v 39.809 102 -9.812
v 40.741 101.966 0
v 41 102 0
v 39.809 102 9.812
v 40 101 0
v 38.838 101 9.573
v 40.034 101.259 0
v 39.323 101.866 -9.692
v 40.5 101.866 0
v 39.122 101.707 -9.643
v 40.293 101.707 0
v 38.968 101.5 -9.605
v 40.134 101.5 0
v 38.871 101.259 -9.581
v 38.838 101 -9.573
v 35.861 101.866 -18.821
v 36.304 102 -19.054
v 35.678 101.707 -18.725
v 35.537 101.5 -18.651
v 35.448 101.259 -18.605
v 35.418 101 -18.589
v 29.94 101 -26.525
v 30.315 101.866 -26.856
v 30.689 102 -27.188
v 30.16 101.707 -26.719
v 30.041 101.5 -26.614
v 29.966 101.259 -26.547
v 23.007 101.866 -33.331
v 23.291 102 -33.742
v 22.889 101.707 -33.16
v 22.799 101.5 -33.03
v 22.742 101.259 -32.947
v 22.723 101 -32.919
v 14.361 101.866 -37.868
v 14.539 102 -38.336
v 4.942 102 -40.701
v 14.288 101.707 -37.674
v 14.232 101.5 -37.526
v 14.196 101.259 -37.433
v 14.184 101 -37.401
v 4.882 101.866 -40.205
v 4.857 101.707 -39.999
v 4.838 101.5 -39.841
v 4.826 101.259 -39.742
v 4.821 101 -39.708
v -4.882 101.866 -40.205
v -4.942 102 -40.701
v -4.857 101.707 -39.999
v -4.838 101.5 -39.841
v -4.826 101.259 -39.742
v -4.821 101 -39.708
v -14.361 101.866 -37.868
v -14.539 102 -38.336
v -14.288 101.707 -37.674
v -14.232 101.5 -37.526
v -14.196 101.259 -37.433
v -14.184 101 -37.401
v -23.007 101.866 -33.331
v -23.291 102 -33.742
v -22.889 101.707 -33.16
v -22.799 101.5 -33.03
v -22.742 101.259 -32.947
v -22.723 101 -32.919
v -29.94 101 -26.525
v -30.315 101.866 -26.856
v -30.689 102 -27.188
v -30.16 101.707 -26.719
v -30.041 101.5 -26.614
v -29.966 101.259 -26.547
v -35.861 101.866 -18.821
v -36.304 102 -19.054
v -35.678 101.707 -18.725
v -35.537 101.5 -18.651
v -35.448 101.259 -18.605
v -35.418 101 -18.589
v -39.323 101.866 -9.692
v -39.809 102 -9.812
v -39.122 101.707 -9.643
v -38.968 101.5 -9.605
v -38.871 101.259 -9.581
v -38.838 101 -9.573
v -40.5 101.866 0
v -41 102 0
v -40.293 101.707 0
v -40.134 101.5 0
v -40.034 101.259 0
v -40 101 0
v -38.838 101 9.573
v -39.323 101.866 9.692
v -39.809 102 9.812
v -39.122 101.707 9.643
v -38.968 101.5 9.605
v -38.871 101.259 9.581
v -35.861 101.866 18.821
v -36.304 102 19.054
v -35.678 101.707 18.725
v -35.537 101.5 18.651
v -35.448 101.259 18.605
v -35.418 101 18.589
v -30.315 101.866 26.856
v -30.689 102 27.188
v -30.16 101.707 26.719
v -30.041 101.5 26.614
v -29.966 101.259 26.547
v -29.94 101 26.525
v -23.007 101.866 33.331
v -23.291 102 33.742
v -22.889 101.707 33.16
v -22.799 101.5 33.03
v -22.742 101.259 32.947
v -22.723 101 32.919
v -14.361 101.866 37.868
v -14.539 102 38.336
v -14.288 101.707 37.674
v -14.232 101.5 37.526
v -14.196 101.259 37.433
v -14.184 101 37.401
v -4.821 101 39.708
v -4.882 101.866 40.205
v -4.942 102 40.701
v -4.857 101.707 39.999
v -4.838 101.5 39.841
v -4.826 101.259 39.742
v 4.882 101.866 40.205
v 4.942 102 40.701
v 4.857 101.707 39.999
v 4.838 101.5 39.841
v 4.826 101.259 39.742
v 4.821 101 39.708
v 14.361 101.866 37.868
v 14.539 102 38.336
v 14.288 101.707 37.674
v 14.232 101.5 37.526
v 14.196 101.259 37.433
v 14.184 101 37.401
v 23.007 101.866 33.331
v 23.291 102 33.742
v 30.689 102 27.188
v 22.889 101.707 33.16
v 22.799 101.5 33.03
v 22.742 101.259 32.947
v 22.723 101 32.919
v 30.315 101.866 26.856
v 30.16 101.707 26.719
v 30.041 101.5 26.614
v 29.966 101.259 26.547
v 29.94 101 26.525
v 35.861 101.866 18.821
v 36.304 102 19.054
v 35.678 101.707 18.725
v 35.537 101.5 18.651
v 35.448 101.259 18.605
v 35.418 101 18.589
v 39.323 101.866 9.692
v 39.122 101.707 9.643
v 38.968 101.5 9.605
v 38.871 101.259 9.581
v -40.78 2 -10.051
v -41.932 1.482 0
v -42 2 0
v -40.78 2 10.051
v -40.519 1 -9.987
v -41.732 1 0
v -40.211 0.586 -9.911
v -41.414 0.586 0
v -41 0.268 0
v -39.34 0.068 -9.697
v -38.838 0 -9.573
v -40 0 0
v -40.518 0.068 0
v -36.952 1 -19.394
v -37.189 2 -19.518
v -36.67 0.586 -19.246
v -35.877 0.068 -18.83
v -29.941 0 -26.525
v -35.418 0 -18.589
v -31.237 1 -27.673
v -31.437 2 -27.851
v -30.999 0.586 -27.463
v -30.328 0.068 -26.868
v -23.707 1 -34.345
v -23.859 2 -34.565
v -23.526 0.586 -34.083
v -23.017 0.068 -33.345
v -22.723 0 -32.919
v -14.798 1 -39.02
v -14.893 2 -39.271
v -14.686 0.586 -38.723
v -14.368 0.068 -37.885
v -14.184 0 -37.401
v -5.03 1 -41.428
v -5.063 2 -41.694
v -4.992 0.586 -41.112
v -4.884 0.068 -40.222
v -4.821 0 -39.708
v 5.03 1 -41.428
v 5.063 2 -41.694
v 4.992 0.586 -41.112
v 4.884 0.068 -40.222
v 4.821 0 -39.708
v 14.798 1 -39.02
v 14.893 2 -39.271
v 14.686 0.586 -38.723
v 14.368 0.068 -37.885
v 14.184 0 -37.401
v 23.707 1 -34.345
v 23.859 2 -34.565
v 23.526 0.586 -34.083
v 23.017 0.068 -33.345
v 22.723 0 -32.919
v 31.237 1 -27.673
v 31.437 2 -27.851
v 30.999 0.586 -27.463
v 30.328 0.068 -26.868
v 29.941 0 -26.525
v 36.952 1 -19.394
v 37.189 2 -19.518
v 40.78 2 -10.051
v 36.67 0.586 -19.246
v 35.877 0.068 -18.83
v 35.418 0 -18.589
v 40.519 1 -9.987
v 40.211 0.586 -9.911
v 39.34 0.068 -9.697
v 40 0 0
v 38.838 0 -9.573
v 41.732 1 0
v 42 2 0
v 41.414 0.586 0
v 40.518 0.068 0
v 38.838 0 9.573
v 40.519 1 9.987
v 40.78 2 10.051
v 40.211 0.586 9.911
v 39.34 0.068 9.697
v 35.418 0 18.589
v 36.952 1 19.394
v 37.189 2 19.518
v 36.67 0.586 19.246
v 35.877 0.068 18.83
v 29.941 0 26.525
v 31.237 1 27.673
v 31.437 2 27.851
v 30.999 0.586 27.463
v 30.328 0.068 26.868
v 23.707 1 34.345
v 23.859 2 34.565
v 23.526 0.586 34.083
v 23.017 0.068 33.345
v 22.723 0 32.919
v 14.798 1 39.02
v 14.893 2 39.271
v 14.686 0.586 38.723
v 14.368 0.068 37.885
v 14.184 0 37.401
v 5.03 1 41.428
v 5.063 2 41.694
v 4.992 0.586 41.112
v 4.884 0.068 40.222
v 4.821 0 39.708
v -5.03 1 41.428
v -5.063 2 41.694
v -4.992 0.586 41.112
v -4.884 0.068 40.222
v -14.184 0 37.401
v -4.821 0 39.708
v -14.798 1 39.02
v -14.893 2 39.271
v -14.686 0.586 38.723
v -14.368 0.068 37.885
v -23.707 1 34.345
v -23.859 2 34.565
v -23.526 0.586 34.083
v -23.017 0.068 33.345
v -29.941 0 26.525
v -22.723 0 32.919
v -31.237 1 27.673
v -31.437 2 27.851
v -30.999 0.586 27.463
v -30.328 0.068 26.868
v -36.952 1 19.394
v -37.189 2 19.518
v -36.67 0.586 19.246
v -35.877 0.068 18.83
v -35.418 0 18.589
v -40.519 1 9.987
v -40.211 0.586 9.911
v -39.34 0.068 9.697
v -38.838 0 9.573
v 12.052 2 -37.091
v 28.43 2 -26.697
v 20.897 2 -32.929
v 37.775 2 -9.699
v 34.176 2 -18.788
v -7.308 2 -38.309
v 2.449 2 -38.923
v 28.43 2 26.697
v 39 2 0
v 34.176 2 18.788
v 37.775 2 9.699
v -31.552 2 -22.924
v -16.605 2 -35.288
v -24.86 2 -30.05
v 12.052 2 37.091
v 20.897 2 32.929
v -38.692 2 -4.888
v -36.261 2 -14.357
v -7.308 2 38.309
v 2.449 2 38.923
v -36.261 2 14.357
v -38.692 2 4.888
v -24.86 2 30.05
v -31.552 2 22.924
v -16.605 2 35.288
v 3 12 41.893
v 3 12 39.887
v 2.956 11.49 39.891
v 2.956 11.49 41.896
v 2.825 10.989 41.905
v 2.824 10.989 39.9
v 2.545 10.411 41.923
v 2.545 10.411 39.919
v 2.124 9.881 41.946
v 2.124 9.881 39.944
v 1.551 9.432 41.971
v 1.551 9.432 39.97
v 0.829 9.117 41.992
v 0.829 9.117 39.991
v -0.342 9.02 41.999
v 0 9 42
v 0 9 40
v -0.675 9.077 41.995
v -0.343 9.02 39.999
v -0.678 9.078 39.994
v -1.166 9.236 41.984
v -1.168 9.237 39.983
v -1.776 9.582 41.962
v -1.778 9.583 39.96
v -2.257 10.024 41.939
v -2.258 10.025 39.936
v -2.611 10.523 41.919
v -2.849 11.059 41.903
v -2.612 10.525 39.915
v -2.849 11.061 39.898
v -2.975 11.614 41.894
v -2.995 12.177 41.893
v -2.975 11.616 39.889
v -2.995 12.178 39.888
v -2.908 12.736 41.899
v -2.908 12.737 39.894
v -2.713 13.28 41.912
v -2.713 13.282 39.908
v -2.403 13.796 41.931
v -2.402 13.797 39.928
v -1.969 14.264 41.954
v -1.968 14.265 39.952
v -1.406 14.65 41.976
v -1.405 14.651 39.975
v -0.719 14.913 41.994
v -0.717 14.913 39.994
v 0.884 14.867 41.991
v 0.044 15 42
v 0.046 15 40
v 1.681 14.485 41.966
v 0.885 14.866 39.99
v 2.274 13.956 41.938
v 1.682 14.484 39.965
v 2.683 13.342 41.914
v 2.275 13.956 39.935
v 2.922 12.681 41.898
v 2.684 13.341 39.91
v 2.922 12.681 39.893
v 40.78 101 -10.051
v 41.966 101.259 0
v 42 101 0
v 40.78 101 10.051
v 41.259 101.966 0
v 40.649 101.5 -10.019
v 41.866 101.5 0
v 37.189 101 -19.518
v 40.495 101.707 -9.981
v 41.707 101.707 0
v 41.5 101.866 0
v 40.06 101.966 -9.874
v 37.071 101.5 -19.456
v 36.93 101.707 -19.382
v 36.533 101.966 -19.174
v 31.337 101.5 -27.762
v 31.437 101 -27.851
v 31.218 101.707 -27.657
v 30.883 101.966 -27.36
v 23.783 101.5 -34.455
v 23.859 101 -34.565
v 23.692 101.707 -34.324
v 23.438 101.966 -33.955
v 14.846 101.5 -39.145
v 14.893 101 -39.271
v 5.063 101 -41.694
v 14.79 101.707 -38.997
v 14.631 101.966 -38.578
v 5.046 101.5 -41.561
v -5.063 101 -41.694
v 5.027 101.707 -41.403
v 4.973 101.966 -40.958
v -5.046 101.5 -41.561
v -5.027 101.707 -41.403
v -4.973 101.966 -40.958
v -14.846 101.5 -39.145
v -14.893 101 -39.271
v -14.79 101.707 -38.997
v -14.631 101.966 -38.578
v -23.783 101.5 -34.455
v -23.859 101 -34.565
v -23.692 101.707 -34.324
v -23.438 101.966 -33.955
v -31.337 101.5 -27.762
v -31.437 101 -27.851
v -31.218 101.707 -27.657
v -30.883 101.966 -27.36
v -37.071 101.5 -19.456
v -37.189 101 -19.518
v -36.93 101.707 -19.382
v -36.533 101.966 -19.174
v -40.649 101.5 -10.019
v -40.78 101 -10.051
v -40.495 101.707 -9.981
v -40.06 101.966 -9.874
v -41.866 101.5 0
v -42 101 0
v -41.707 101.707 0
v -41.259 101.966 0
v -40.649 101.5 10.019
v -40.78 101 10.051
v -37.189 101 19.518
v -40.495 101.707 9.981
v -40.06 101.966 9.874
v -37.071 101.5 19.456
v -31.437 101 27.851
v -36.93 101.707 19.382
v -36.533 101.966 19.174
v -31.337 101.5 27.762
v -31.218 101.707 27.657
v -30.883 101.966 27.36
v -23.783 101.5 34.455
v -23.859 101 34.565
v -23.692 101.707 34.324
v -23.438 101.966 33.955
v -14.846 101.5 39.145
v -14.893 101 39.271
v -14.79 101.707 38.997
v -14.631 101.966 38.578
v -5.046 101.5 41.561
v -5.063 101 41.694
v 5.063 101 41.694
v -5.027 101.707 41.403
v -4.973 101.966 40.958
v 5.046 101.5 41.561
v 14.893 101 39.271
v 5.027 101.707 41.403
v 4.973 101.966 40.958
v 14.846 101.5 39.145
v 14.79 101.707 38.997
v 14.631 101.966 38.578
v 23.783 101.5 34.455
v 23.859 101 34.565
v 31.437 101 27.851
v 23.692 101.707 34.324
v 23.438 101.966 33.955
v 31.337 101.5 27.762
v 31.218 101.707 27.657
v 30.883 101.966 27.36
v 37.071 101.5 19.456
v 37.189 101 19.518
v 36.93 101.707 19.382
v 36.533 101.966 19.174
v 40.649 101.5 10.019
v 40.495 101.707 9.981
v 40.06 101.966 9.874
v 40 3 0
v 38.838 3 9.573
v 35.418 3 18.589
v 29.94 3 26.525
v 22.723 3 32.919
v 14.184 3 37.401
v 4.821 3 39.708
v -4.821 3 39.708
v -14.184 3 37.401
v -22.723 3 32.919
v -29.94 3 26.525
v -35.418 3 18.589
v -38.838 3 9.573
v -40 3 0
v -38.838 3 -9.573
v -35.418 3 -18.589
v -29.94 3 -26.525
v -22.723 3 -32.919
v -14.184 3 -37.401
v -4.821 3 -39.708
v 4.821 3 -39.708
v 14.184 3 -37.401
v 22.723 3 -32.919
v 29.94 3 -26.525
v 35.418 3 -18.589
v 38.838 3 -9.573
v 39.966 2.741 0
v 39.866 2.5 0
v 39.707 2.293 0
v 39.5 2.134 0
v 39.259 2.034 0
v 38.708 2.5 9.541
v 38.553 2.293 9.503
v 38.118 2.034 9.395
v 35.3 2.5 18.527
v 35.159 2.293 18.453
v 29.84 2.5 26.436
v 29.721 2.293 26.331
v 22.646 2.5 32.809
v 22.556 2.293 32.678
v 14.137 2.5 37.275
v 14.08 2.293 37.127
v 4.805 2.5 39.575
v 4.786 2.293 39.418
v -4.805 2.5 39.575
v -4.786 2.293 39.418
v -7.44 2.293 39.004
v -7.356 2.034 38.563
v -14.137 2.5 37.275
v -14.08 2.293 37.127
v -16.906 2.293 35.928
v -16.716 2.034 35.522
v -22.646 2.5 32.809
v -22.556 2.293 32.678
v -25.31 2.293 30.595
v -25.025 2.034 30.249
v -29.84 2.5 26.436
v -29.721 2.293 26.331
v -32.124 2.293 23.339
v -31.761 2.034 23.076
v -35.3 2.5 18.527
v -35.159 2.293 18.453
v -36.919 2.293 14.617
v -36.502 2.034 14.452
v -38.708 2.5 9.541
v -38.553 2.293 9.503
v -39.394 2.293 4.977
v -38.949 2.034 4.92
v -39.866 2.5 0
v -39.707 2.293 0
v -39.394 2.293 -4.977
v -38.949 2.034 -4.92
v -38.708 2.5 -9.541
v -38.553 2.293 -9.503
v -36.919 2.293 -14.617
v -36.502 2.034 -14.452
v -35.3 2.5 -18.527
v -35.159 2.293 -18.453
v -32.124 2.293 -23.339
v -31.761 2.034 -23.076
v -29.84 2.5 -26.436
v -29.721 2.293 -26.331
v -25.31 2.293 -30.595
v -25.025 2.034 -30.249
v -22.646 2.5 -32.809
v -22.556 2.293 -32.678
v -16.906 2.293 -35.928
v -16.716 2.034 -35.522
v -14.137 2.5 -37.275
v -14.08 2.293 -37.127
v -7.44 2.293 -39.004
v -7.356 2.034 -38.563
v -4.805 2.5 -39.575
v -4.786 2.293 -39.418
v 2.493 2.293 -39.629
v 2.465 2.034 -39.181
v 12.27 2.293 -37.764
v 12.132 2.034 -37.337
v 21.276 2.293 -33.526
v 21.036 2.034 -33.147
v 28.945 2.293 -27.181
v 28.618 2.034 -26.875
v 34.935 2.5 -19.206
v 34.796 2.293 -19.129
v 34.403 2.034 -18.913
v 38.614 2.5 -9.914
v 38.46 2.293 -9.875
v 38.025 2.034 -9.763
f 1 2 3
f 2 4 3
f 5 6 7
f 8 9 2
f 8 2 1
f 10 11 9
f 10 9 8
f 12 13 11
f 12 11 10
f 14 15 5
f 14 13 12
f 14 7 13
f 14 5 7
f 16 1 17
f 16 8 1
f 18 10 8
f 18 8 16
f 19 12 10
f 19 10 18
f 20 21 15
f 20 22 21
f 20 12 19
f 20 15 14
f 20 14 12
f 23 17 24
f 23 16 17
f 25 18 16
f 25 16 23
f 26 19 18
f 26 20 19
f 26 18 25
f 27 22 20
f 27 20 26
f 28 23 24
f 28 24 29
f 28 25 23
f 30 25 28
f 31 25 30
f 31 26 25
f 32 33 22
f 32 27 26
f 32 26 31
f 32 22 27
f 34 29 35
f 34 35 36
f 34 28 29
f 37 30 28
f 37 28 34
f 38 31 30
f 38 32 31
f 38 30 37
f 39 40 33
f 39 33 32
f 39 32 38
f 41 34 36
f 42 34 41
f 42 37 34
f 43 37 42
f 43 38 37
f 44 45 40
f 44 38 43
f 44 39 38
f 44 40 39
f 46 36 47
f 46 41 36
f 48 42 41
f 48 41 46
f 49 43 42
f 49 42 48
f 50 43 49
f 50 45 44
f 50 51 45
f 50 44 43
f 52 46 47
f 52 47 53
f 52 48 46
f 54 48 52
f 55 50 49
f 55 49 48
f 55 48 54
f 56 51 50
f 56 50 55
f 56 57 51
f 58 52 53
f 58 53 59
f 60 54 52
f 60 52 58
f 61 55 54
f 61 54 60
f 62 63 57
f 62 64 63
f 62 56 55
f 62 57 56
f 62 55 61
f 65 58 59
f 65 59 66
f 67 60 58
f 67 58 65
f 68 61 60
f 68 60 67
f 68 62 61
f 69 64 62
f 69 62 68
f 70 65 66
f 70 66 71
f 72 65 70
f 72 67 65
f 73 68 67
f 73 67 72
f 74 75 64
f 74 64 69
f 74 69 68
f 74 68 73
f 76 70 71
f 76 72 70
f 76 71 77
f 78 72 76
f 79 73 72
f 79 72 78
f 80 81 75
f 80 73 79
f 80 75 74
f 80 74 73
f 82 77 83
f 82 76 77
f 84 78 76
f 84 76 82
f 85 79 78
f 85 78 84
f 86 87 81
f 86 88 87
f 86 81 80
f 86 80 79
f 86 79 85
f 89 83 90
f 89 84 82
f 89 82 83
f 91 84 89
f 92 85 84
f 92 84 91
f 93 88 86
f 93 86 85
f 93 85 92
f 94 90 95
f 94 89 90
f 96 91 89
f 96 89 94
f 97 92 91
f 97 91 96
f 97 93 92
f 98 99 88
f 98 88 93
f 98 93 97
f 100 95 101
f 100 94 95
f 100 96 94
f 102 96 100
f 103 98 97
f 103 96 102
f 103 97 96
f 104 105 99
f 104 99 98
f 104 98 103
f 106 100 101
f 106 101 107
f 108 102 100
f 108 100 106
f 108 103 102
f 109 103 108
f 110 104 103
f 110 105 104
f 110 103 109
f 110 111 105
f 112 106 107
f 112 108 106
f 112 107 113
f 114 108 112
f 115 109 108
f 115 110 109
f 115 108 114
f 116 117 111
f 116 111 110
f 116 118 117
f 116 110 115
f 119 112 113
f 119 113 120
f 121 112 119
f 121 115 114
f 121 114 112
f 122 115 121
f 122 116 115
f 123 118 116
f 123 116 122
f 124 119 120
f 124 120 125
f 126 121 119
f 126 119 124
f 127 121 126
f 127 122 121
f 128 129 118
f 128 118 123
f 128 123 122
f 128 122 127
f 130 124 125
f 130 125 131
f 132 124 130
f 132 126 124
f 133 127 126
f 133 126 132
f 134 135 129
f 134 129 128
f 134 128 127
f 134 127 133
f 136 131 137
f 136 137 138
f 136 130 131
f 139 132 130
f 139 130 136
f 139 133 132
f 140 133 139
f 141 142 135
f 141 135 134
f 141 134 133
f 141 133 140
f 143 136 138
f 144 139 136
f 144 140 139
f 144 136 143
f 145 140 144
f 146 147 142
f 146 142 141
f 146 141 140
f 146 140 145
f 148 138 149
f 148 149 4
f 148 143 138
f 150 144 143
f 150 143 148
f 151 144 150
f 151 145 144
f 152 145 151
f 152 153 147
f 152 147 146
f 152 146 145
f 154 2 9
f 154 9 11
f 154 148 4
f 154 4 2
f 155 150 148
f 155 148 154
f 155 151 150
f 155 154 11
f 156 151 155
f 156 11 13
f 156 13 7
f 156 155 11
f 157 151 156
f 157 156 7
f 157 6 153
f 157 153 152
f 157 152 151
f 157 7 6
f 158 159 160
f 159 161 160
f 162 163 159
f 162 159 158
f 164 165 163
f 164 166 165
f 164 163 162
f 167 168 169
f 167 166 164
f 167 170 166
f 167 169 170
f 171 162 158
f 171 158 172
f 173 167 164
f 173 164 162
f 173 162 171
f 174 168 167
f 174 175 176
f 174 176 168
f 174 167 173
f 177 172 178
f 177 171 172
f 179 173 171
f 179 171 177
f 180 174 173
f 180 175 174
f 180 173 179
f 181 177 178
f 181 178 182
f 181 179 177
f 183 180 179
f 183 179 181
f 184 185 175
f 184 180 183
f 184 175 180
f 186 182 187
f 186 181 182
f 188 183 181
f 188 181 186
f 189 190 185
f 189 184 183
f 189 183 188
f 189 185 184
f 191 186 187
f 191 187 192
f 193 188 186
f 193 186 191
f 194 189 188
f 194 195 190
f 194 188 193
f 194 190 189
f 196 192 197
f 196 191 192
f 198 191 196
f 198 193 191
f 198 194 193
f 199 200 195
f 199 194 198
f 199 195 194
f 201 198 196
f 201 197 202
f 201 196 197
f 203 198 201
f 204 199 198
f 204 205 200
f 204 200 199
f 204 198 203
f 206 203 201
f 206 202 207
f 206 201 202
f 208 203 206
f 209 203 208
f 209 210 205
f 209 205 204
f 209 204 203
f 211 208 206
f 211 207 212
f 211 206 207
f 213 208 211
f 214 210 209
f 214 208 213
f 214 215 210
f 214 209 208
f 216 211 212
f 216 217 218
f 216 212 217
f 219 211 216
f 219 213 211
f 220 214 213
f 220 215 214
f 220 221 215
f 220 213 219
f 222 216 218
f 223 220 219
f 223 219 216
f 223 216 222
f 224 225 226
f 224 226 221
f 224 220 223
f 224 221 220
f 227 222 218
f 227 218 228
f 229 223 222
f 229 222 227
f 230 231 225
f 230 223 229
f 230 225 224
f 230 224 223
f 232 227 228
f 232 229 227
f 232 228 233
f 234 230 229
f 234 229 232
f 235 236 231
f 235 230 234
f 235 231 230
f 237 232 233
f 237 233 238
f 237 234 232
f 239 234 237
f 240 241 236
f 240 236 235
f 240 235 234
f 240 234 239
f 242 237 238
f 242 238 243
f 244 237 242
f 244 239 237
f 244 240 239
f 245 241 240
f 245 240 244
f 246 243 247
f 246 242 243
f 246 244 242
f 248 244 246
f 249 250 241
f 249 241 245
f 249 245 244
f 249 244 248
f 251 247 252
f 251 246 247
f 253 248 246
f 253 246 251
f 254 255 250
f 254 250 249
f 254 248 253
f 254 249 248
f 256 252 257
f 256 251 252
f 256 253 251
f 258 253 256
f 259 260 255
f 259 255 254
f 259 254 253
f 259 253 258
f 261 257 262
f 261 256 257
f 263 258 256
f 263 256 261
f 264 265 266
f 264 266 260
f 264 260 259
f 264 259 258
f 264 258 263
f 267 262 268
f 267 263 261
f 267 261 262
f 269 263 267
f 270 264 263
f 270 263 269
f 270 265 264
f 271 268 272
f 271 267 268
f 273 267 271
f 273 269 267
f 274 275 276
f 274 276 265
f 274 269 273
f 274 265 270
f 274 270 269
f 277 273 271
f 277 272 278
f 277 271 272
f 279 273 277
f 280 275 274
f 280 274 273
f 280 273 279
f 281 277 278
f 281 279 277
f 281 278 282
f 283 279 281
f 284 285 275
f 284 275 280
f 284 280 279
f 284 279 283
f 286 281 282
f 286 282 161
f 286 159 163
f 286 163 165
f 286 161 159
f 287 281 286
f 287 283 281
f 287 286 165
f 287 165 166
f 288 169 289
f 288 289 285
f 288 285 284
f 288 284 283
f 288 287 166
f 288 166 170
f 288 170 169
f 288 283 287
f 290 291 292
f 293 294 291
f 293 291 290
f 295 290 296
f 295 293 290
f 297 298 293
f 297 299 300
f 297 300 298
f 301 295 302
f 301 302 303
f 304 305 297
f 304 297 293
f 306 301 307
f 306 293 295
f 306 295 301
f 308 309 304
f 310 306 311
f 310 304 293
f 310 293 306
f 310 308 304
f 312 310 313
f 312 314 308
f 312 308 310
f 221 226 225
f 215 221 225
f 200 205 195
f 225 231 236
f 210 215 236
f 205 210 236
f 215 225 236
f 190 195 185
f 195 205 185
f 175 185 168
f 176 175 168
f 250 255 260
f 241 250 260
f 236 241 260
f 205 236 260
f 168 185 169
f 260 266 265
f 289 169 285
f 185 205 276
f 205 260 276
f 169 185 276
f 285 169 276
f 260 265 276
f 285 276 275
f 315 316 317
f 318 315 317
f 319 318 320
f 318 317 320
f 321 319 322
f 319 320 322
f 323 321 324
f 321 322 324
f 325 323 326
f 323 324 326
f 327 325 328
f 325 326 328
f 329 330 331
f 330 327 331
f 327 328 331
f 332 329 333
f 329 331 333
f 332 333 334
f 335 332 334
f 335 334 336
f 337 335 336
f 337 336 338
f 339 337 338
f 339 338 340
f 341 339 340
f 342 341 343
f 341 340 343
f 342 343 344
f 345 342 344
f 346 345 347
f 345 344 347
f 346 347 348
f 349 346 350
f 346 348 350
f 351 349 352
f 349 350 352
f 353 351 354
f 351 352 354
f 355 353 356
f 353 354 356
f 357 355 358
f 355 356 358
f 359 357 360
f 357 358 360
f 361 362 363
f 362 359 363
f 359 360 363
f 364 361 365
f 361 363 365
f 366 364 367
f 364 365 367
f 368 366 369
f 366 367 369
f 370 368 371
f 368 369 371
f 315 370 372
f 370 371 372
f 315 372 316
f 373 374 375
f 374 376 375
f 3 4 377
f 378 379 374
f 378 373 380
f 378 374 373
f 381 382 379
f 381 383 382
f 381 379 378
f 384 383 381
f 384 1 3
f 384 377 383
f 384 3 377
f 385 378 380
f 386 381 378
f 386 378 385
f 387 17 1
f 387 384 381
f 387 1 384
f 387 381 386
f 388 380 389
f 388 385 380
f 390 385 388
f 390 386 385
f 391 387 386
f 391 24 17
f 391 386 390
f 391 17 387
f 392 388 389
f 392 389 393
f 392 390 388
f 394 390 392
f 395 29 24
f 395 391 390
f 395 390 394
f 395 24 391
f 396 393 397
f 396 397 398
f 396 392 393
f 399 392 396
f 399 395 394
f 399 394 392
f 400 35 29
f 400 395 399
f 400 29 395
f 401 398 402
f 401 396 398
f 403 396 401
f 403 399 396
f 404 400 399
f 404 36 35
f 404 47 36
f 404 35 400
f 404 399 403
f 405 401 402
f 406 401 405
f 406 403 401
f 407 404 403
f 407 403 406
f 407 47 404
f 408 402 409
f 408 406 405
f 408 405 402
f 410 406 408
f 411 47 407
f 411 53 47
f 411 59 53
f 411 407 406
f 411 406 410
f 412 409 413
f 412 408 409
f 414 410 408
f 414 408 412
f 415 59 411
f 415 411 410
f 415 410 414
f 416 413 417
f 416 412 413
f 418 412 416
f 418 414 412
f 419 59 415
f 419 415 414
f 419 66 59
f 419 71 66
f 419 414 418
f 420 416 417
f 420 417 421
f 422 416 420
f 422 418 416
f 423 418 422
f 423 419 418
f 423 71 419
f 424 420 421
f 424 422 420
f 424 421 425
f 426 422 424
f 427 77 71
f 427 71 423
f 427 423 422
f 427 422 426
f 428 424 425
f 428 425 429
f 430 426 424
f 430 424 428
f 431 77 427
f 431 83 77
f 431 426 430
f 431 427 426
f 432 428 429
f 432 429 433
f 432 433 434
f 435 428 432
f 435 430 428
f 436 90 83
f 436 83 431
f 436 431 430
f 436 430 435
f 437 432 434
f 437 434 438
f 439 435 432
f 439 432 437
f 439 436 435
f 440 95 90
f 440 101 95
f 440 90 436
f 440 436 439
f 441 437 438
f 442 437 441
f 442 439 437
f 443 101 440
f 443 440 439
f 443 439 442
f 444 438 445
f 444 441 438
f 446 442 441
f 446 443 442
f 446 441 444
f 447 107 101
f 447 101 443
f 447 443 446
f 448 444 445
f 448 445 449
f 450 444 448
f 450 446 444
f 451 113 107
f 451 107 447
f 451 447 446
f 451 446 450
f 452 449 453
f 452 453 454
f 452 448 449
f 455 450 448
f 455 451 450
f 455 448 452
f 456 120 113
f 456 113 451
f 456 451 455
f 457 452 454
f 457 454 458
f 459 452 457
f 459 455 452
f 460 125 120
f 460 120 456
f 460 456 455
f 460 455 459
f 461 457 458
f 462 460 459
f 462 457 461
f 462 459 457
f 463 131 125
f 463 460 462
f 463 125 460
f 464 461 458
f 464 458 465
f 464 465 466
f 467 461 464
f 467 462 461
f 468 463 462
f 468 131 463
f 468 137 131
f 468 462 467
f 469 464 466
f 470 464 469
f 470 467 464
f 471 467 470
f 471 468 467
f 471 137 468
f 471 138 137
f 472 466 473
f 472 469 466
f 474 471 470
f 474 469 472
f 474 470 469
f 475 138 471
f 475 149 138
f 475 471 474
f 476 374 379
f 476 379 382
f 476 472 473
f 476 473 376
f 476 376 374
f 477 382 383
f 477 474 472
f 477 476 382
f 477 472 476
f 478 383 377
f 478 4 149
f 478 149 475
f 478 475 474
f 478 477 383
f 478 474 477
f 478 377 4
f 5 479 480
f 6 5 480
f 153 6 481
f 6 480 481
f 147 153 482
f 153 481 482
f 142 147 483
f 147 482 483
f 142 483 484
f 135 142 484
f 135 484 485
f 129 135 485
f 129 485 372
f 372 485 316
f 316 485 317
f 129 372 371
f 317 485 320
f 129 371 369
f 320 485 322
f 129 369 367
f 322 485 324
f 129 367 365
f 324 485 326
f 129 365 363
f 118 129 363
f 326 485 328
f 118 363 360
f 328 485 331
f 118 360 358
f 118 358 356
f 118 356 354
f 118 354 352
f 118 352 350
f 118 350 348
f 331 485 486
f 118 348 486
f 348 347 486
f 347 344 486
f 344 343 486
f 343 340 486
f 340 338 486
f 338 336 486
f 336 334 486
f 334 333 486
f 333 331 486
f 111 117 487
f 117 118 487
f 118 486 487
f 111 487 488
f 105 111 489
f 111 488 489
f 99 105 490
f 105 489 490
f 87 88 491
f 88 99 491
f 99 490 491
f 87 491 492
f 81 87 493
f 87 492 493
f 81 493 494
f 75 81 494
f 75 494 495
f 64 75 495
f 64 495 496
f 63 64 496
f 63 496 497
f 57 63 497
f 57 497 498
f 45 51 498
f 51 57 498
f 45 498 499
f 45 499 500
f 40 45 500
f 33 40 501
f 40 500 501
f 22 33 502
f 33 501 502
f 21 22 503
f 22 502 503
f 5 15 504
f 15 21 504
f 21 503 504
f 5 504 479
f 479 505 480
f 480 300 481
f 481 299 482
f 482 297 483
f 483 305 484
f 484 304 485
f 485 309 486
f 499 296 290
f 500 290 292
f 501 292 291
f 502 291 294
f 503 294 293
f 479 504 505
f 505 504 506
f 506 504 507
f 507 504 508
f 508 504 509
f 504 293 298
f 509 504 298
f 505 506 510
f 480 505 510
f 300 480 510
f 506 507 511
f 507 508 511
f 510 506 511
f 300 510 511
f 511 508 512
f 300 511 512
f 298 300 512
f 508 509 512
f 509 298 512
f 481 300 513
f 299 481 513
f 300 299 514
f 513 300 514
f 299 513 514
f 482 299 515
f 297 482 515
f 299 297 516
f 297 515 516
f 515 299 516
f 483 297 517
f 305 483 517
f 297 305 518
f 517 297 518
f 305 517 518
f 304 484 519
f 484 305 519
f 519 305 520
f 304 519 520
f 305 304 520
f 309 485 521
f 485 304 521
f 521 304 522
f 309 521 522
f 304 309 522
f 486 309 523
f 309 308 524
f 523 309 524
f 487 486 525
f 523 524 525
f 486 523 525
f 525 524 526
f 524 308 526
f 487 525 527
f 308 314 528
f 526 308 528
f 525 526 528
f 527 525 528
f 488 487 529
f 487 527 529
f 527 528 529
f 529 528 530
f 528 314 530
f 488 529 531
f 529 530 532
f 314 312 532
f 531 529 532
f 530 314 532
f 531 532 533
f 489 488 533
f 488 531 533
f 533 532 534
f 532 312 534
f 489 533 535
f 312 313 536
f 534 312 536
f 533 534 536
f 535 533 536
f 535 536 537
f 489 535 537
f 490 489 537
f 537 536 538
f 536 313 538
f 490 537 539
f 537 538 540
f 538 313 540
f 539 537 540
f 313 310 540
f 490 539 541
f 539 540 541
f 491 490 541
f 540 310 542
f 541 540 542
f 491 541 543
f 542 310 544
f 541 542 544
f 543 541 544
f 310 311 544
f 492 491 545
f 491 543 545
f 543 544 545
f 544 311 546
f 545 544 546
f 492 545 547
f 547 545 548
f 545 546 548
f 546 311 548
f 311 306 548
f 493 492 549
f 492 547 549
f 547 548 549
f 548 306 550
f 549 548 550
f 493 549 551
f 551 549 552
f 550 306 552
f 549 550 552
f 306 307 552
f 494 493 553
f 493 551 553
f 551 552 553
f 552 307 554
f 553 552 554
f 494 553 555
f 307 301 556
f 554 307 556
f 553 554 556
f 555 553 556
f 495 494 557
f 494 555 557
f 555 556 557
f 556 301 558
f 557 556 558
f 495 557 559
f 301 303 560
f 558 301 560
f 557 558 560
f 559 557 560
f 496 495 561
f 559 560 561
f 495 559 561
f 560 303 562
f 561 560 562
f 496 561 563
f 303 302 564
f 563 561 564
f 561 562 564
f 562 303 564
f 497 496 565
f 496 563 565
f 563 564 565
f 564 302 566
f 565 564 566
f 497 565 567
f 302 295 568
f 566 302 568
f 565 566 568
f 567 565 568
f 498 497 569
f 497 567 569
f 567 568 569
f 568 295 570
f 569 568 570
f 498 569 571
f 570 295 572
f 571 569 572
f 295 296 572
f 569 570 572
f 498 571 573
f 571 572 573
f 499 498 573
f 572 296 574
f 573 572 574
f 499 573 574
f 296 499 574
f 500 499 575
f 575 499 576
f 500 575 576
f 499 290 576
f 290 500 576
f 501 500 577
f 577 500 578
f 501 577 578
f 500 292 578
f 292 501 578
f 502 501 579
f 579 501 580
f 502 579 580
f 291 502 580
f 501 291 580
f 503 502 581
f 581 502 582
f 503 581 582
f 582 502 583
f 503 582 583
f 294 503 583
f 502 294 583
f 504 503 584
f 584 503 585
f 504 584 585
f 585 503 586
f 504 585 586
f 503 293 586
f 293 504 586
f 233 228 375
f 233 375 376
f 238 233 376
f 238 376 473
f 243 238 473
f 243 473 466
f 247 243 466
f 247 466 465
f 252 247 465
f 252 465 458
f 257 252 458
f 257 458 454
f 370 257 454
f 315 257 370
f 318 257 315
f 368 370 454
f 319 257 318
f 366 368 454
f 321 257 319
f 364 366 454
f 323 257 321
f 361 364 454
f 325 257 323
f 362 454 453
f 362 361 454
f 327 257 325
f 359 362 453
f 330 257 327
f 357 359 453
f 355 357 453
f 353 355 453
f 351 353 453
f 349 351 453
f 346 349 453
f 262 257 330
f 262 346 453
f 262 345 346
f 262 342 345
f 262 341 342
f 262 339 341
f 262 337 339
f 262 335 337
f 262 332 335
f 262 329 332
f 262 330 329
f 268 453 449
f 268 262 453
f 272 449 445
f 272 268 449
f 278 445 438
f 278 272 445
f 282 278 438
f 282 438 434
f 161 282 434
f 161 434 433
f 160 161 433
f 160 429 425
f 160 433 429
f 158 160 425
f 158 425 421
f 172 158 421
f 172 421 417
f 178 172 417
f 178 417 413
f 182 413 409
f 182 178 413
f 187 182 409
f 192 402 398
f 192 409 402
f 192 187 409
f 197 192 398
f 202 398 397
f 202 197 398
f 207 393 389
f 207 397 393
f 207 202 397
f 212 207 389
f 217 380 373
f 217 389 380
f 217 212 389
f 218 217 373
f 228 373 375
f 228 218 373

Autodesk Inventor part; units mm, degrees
ref_plane "YZ Plane" through (0, 0, 0) normal (1, 0, 0) x (0, 1, 0)
ref_plane "XZ Plane" through (0, 0, 0) normal (0, 1, 0) x (-1, 0, 0)
ref_plane "XY Plane" through (0, 0, 0) normal (0, 0, 1) x (1, 0, 0)
sketch "Sketch1" plane through (0, 0, 0) normal (0, 1, 0) x (-1, 0, 0)
  circle A0 centre (0, 0) radius 42
  dimension "d0" = 84
extrude "Extrusion1" add sketch "Sketch1" along normal blind 2
sketch "Sketch2" plane through (0, 2, 0) normal (0, 1, 0) x (1, 0, 0)
  circle A0 centre (0, 0) radius 42
  circle A1 centre (0, 0) radius 40
  dimension "d3" = 80
  dimension "d6" = 84
extrude "Extrusion2" add sketch "Sketch2" along normal blind 100
fillet "Fillet1" radius 2 1 edges at (42, 0, 0)
fillet "Fillet2" radius 1 2 edges at (-42, 102, 0) (-40, 102, 0)
fillet "Fillet3" radius 1 1 edges at (-40, 2, 0)
sketch "Sketch3" plane through (0, 0, 0) normal (0, 0, 1) x (1, 0, 0)
  line L0 (-42, 2) -> (42, 2) projected
  line L1 (0, 2) -> (0, 12)
  circle A0 centre (0, 12) radius 3
  point P0 (0, 0)
  dimension "d10" = 10
  dimension "d11" = 6
extrude "Extrusion3" cut sketch "Sketch3" along normal through all
ref_plane "Work Plane1" through (0, 0, 42) normal (0, 0, 1) x (1, 0, 0)
properties part number "Reservoir"
